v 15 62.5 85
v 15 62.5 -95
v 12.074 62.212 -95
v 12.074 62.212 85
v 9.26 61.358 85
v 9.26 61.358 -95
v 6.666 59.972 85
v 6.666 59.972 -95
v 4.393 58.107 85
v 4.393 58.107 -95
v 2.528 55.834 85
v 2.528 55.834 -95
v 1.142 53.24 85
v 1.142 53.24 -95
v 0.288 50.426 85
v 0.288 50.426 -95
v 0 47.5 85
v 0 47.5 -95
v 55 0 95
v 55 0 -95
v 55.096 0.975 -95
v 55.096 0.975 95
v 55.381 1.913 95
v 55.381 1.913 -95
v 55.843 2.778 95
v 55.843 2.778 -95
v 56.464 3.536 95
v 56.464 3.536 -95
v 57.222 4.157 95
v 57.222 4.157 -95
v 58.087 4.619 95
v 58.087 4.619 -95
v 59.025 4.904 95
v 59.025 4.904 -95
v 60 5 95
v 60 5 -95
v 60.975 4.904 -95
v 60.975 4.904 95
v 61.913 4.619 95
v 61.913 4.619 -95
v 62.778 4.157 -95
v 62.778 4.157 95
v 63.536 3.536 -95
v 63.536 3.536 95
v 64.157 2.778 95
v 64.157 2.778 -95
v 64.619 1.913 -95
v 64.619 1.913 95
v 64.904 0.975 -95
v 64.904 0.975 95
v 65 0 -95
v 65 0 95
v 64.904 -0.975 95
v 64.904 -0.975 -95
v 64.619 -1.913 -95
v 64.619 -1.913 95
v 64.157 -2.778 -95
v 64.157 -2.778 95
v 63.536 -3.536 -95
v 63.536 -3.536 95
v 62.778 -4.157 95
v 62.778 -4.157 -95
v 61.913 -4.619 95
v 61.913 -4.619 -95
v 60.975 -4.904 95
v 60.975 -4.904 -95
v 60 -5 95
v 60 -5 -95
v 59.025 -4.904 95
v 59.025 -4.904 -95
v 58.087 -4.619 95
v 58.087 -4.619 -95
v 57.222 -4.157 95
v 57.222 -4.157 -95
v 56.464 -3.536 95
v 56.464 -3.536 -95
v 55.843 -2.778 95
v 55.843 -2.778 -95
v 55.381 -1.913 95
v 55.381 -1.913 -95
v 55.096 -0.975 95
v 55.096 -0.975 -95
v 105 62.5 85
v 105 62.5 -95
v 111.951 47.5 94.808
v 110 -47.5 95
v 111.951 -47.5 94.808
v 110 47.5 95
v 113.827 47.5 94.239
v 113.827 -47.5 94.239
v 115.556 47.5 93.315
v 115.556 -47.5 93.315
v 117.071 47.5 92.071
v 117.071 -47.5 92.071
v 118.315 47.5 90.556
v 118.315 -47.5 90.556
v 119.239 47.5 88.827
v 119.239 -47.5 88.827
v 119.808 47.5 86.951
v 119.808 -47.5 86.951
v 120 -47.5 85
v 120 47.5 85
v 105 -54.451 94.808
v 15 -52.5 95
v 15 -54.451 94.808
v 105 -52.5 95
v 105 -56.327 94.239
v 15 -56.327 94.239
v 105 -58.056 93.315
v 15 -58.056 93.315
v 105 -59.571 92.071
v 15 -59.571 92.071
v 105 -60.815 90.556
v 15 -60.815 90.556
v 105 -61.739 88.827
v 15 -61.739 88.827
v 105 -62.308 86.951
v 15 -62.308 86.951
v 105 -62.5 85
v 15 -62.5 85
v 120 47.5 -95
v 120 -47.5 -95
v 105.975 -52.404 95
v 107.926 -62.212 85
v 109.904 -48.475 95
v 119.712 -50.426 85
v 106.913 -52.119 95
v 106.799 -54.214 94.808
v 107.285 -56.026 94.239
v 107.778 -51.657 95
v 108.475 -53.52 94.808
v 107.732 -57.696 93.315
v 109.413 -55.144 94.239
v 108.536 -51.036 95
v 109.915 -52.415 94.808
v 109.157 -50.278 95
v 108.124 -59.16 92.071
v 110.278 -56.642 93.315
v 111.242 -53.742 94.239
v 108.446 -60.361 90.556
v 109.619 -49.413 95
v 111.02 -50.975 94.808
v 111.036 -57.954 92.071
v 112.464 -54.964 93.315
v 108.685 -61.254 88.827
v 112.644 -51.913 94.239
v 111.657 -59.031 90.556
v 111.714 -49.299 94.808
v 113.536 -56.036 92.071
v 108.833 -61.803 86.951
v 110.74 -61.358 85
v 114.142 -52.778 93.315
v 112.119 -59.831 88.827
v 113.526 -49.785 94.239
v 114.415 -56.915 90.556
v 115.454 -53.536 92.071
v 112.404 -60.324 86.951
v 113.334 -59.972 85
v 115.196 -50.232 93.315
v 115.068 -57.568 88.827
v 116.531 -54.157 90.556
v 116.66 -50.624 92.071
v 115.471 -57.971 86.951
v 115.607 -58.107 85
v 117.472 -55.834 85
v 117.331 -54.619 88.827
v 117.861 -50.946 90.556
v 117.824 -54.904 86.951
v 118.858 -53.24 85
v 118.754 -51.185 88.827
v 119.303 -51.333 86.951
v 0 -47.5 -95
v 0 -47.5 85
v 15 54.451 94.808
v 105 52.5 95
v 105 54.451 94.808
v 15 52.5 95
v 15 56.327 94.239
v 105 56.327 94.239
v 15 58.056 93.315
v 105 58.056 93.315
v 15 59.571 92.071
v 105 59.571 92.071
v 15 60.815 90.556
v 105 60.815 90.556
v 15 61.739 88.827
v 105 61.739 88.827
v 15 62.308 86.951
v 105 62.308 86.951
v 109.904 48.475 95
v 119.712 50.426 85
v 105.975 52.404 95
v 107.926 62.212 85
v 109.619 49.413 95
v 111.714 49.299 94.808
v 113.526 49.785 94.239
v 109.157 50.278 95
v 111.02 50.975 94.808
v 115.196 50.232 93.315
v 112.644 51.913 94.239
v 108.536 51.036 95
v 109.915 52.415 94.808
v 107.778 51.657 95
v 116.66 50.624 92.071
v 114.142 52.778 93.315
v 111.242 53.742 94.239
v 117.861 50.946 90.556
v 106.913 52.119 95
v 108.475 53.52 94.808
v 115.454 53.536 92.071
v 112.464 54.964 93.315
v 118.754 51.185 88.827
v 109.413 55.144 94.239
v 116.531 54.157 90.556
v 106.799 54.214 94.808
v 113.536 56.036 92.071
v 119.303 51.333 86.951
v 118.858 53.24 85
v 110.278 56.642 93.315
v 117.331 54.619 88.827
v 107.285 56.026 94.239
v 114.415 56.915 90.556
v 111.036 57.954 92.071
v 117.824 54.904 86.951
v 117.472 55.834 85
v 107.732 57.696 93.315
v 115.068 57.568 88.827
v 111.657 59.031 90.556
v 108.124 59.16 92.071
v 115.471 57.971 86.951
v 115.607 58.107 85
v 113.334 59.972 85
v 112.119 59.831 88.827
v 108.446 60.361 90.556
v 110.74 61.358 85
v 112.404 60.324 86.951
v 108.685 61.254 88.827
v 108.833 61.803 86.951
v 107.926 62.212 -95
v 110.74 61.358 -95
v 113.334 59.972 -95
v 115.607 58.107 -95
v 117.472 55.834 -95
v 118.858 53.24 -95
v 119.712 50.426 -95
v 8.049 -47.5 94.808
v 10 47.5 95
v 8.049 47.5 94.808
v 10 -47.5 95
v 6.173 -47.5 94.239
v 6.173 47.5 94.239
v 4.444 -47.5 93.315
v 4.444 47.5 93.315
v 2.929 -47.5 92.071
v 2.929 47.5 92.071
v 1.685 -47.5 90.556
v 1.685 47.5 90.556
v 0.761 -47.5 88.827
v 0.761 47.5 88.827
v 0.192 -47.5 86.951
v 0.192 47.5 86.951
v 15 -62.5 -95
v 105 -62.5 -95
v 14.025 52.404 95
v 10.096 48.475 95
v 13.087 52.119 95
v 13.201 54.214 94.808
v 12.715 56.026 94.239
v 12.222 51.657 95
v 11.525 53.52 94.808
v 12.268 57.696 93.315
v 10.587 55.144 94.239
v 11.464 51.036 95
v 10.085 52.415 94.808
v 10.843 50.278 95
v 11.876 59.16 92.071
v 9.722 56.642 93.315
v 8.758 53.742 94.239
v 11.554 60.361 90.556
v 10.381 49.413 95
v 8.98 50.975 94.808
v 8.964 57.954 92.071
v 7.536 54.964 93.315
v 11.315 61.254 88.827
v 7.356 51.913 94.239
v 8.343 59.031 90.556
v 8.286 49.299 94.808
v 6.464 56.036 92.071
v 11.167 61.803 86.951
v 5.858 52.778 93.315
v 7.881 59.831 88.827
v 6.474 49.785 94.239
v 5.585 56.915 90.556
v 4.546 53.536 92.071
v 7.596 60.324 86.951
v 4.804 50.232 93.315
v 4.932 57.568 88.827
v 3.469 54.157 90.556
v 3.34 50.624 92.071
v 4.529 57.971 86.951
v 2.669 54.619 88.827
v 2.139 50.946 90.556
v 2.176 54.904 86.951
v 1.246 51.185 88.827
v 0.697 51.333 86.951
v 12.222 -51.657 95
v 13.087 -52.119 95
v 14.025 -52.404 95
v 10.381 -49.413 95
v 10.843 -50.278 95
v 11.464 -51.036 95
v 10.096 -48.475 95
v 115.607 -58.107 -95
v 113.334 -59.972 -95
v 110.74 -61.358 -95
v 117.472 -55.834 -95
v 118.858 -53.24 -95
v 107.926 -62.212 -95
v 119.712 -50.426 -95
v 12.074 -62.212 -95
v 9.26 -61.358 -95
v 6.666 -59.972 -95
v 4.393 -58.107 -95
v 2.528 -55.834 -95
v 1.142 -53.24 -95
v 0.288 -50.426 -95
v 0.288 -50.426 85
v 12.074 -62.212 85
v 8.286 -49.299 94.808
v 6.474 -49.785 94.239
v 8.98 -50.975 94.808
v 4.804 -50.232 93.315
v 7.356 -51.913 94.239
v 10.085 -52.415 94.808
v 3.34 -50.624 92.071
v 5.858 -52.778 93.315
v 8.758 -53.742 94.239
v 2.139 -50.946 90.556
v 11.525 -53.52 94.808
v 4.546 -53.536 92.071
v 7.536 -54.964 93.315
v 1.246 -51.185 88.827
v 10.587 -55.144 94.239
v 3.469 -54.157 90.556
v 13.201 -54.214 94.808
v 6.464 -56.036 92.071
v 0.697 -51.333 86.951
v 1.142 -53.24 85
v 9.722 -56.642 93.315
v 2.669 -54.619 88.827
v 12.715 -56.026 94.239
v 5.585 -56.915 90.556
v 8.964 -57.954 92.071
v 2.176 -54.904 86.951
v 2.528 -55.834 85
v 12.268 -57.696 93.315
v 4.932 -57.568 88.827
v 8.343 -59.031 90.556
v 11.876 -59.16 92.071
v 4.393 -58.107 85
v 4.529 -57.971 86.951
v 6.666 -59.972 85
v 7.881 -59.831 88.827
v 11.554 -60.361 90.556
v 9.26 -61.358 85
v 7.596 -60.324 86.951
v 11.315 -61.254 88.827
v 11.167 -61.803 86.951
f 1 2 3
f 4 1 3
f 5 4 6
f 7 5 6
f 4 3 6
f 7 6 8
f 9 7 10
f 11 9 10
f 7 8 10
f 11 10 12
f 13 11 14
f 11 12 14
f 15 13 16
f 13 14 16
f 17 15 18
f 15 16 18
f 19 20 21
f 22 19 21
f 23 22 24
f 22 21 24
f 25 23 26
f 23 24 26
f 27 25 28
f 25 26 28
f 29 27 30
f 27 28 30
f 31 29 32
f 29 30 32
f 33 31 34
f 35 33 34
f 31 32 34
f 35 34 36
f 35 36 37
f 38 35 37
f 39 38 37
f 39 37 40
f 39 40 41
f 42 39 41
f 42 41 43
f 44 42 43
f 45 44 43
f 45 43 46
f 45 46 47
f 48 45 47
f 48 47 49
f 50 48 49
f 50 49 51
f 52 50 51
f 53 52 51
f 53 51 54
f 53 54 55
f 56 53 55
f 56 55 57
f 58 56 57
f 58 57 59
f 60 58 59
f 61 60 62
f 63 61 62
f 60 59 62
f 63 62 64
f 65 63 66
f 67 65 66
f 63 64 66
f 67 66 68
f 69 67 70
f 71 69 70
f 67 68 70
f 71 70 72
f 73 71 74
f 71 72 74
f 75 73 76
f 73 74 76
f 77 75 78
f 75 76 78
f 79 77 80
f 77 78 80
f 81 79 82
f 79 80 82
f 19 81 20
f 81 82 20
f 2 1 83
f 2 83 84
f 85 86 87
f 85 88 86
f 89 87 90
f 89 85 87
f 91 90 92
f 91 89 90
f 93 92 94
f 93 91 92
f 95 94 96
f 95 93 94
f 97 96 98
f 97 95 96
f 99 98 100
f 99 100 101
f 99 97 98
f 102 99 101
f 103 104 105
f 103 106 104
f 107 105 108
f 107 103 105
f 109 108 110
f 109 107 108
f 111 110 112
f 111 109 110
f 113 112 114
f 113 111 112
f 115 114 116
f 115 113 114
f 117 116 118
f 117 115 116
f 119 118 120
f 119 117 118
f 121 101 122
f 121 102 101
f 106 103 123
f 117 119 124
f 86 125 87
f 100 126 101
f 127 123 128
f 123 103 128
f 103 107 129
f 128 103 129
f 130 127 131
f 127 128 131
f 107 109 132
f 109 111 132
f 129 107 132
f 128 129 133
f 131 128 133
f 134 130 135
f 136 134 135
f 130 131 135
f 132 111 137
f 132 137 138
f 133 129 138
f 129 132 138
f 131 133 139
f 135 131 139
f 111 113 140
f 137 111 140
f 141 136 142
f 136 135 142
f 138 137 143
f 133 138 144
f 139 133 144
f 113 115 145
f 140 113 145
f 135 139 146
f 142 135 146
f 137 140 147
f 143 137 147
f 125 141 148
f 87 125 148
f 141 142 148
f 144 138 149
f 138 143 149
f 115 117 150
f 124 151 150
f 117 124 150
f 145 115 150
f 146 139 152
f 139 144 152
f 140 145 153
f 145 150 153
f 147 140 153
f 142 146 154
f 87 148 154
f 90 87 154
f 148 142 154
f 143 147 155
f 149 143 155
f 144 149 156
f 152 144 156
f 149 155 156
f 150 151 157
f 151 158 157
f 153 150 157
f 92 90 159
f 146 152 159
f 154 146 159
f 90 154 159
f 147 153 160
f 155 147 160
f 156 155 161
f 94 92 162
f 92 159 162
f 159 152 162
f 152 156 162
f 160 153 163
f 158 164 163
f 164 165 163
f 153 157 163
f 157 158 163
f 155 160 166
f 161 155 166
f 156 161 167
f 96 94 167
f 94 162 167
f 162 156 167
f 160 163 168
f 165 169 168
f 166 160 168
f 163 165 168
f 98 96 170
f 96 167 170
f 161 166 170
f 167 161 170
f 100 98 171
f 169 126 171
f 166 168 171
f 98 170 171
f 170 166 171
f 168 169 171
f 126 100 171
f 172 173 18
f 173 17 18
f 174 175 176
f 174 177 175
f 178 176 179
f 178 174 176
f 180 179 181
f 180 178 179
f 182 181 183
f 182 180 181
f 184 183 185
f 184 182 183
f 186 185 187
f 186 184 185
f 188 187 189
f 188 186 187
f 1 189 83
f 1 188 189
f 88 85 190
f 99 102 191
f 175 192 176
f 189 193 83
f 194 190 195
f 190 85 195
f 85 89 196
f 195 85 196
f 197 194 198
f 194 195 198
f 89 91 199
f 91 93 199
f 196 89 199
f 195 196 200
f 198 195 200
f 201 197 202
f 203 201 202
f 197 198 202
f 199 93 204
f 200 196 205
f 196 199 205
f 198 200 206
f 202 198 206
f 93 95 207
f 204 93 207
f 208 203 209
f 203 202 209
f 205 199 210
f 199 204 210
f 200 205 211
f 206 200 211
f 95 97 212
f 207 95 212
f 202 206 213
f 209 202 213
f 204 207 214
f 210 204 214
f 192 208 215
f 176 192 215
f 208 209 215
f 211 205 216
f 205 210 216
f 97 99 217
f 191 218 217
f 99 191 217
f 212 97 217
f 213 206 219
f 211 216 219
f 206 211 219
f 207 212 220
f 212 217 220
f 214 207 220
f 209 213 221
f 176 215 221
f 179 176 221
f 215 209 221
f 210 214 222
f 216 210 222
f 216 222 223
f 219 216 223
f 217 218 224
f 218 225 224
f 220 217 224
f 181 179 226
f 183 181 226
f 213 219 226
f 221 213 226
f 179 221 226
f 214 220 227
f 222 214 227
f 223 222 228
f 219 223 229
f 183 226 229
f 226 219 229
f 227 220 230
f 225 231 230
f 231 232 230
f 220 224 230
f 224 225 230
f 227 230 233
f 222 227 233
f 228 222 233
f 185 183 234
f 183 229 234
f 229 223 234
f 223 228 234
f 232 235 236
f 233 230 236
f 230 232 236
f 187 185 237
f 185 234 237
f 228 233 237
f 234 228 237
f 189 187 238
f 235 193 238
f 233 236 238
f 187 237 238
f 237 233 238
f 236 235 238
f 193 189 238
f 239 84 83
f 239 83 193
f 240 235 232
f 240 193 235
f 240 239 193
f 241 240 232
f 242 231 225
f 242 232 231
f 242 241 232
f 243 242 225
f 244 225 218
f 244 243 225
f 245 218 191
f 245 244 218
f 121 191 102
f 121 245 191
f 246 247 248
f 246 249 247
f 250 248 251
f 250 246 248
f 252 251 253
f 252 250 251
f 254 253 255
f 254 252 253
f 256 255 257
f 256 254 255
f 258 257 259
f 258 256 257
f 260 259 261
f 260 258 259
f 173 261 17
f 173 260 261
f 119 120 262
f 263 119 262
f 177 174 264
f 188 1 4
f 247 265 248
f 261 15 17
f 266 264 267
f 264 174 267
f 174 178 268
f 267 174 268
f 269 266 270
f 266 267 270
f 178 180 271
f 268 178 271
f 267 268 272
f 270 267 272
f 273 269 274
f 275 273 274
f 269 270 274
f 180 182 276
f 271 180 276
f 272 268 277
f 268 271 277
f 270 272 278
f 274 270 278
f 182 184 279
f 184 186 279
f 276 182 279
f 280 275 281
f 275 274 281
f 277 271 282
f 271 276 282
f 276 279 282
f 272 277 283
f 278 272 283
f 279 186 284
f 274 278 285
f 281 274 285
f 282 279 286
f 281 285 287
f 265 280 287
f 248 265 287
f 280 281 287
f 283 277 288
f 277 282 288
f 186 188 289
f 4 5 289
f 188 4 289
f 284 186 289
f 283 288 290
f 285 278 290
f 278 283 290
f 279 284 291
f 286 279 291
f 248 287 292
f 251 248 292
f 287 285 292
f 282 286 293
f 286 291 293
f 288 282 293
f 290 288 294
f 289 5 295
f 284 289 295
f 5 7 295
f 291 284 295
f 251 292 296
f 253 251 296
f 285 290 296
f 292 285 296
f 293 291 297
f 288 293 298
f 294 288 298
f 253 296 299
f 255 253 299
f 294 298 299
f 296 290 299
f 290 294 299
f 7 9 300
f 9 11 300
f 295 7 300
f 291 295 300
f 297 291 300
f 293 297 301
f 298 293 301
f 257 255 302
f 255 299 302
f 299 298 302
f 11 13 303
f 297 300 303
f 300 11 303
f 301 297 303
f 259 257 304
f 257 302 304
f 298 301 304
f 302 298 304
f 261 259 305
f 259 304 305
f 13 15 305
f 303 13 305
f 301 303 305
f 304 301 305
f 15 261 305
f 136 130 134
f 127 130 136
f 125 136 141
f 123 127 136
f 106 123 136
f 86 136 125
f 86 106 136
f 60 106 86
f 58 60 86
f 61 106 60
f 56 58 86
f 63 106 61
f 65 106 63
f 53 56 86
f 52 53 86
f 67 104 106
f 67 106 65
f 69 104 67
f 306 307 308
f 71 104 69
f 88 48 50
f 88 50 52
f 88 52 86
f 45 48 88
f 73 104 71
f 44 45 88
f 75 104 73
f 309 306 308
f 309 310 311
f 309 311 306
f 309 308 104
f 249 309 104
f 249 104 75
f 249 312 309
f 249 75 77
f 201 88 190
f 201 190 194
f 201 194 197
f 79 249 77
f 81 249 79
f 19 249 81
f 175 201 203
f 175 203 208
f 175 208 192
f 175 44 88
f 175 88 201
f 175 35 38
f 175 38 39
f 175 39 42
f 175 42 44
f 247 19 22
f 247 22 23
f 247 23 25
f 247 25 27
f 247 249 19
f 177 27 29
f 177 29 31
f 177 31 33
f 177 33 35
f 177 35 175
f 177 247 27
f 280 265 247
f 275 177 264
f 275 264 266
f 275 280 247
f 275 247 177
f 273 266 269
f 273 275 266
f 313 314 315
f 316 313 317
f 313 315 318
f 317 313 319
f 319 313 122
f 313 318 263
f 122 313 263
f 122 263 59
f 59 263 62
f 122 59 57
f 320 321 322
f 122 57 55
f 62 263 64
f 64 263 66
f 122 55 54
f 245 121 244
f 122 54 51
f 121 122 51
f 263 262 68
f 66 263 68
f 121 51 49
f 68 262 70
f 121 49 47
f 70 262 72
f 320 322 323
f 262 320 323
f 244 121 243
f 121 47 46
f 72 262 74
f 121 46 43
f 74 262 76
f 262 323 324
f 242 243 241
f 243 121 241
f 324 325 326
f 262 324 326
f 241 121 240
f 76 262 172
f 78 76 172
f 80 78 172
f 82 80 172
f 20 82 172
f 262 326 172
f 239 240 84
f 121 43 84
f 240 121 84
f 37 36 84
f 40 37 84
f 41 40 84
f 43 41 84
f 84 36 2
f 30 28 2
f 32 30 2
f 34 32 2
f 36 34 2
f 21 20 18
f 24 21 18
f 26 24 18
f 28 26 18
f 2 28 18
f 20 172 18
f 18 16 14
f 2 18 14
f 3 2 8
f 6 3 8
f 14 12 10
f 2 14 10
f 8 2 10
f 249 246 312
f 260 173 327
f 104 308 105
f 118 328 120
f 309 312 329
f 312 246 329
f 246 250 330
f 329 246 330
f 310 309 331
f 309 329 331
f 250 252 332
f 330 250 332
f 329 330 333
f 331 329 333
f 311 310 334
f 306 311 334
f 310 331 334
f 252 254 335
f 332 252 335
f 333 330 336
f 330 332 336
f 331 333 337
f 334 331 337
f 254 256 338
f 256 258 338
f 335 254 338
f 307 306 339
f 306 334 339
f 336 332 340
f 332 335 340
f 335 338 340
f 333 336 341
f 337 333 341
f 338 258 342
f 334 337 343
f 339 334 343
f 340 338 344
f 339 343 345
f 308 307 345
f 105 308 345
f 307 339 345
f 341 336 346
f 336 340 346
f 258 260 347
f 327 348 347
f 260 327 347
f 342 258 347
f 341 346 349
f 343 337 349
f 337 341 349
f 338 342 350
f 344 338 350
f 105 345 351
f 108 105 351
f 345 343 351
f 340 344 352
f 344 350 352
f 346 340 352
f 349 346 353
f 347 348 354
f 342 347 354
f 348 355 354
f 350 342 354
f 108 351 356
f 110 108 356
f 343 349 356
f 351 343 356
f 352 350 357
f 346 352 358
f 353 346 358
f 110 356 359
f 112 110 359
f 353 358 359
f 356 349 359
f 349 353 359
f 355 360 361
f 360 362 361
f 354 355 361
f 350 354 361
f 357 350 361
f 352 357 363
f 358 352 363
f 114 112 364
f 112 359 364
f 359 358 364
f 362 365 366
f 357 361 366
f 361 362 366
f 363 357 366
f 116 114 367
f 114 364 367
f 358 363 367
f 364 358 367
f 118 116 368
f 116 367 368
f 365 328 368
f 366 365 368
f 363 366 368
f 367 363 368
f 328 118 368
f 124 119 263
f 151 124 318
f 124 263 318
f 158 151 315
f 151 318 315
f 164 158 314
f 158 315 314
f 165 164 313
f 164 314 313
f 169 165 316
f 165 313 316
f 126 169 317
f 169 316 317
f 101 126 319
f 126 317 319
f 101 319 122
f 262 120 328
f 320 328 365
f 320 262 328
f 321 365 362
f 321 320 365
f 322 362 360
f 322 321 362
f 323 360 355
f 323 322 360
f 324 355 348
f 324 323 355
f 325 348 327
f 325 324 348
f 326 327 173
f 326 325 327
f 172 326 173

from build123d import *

# Parameters (mm, degrees)
SCHIZZO2_W                   = 190
SCHIZZO2_H                   = 125
ESTRUSIONE_ESTRUSIONE1_DEPTH = 120
RACCORDO1_R                  = 15
RACCORDO2_R                  = 10
SCHIZZO3_R                   = 5
TAGLIO_ESTRUSIONE1_DEPTH     = 191


with BuildPart() as part:
    # Schizzo2 → Estrusione-Estrusione1 (new body)
    with BuildSketch(Plane(origin=(0, 0, 0), x_dir=(0, 0, -1), z_dir=(1, 0, 0))):
        Rectangle(SCHIZZO2_W, SCHIZZO2_H)
    extrude(amount=ESTRUSIONE_ESTRUSIONE1_DEPTH)

    # Raccordo1
    raccordo1_edges = [part.edges().sort_by_distance(p)[0] for p in [
        (120, -62.5, 0),
        (0, -62.5, 0),
        (0, 62.5, 0),
        (120, 62.5, 0),
    ]]
    fillet(raccordo1_edges, radius=RACCORDO1_R)

    # Raccordo2
    raccordo2_edges = [part.edges().sort_by_distance(p)[0] for p in [
        (120, 0, 95),
        (0, 0, 95),
        (60, -62.5, 95),
        (60, 62.5, 95),
        (4.393398282, -58.106601718, 95),
        (4.393398282, 58.106601718, 95),
        (115.606601718, -58.106601718, 95),
        (115.606601718, 58.106601718, 95),
    ]]
    fillet(raccordo2_edges, radius=RACCORDO2_R)

    # Schizzo3 → Taglio-Estrusione1 (cut, through all)
    with BuildSketch(Plane(origin=(0, 0, -95), x_dir=(-1, 0, 0), z_dir=(0, 0, -1))):
        with Locations((-60, 0)):
            Circle(SCHIZZO3_R)
    extrude(amount=-TAGLIO_ESTRUSIONE1_DEPTH, mode=Mode.SUBTRACT)


solid = part.part
